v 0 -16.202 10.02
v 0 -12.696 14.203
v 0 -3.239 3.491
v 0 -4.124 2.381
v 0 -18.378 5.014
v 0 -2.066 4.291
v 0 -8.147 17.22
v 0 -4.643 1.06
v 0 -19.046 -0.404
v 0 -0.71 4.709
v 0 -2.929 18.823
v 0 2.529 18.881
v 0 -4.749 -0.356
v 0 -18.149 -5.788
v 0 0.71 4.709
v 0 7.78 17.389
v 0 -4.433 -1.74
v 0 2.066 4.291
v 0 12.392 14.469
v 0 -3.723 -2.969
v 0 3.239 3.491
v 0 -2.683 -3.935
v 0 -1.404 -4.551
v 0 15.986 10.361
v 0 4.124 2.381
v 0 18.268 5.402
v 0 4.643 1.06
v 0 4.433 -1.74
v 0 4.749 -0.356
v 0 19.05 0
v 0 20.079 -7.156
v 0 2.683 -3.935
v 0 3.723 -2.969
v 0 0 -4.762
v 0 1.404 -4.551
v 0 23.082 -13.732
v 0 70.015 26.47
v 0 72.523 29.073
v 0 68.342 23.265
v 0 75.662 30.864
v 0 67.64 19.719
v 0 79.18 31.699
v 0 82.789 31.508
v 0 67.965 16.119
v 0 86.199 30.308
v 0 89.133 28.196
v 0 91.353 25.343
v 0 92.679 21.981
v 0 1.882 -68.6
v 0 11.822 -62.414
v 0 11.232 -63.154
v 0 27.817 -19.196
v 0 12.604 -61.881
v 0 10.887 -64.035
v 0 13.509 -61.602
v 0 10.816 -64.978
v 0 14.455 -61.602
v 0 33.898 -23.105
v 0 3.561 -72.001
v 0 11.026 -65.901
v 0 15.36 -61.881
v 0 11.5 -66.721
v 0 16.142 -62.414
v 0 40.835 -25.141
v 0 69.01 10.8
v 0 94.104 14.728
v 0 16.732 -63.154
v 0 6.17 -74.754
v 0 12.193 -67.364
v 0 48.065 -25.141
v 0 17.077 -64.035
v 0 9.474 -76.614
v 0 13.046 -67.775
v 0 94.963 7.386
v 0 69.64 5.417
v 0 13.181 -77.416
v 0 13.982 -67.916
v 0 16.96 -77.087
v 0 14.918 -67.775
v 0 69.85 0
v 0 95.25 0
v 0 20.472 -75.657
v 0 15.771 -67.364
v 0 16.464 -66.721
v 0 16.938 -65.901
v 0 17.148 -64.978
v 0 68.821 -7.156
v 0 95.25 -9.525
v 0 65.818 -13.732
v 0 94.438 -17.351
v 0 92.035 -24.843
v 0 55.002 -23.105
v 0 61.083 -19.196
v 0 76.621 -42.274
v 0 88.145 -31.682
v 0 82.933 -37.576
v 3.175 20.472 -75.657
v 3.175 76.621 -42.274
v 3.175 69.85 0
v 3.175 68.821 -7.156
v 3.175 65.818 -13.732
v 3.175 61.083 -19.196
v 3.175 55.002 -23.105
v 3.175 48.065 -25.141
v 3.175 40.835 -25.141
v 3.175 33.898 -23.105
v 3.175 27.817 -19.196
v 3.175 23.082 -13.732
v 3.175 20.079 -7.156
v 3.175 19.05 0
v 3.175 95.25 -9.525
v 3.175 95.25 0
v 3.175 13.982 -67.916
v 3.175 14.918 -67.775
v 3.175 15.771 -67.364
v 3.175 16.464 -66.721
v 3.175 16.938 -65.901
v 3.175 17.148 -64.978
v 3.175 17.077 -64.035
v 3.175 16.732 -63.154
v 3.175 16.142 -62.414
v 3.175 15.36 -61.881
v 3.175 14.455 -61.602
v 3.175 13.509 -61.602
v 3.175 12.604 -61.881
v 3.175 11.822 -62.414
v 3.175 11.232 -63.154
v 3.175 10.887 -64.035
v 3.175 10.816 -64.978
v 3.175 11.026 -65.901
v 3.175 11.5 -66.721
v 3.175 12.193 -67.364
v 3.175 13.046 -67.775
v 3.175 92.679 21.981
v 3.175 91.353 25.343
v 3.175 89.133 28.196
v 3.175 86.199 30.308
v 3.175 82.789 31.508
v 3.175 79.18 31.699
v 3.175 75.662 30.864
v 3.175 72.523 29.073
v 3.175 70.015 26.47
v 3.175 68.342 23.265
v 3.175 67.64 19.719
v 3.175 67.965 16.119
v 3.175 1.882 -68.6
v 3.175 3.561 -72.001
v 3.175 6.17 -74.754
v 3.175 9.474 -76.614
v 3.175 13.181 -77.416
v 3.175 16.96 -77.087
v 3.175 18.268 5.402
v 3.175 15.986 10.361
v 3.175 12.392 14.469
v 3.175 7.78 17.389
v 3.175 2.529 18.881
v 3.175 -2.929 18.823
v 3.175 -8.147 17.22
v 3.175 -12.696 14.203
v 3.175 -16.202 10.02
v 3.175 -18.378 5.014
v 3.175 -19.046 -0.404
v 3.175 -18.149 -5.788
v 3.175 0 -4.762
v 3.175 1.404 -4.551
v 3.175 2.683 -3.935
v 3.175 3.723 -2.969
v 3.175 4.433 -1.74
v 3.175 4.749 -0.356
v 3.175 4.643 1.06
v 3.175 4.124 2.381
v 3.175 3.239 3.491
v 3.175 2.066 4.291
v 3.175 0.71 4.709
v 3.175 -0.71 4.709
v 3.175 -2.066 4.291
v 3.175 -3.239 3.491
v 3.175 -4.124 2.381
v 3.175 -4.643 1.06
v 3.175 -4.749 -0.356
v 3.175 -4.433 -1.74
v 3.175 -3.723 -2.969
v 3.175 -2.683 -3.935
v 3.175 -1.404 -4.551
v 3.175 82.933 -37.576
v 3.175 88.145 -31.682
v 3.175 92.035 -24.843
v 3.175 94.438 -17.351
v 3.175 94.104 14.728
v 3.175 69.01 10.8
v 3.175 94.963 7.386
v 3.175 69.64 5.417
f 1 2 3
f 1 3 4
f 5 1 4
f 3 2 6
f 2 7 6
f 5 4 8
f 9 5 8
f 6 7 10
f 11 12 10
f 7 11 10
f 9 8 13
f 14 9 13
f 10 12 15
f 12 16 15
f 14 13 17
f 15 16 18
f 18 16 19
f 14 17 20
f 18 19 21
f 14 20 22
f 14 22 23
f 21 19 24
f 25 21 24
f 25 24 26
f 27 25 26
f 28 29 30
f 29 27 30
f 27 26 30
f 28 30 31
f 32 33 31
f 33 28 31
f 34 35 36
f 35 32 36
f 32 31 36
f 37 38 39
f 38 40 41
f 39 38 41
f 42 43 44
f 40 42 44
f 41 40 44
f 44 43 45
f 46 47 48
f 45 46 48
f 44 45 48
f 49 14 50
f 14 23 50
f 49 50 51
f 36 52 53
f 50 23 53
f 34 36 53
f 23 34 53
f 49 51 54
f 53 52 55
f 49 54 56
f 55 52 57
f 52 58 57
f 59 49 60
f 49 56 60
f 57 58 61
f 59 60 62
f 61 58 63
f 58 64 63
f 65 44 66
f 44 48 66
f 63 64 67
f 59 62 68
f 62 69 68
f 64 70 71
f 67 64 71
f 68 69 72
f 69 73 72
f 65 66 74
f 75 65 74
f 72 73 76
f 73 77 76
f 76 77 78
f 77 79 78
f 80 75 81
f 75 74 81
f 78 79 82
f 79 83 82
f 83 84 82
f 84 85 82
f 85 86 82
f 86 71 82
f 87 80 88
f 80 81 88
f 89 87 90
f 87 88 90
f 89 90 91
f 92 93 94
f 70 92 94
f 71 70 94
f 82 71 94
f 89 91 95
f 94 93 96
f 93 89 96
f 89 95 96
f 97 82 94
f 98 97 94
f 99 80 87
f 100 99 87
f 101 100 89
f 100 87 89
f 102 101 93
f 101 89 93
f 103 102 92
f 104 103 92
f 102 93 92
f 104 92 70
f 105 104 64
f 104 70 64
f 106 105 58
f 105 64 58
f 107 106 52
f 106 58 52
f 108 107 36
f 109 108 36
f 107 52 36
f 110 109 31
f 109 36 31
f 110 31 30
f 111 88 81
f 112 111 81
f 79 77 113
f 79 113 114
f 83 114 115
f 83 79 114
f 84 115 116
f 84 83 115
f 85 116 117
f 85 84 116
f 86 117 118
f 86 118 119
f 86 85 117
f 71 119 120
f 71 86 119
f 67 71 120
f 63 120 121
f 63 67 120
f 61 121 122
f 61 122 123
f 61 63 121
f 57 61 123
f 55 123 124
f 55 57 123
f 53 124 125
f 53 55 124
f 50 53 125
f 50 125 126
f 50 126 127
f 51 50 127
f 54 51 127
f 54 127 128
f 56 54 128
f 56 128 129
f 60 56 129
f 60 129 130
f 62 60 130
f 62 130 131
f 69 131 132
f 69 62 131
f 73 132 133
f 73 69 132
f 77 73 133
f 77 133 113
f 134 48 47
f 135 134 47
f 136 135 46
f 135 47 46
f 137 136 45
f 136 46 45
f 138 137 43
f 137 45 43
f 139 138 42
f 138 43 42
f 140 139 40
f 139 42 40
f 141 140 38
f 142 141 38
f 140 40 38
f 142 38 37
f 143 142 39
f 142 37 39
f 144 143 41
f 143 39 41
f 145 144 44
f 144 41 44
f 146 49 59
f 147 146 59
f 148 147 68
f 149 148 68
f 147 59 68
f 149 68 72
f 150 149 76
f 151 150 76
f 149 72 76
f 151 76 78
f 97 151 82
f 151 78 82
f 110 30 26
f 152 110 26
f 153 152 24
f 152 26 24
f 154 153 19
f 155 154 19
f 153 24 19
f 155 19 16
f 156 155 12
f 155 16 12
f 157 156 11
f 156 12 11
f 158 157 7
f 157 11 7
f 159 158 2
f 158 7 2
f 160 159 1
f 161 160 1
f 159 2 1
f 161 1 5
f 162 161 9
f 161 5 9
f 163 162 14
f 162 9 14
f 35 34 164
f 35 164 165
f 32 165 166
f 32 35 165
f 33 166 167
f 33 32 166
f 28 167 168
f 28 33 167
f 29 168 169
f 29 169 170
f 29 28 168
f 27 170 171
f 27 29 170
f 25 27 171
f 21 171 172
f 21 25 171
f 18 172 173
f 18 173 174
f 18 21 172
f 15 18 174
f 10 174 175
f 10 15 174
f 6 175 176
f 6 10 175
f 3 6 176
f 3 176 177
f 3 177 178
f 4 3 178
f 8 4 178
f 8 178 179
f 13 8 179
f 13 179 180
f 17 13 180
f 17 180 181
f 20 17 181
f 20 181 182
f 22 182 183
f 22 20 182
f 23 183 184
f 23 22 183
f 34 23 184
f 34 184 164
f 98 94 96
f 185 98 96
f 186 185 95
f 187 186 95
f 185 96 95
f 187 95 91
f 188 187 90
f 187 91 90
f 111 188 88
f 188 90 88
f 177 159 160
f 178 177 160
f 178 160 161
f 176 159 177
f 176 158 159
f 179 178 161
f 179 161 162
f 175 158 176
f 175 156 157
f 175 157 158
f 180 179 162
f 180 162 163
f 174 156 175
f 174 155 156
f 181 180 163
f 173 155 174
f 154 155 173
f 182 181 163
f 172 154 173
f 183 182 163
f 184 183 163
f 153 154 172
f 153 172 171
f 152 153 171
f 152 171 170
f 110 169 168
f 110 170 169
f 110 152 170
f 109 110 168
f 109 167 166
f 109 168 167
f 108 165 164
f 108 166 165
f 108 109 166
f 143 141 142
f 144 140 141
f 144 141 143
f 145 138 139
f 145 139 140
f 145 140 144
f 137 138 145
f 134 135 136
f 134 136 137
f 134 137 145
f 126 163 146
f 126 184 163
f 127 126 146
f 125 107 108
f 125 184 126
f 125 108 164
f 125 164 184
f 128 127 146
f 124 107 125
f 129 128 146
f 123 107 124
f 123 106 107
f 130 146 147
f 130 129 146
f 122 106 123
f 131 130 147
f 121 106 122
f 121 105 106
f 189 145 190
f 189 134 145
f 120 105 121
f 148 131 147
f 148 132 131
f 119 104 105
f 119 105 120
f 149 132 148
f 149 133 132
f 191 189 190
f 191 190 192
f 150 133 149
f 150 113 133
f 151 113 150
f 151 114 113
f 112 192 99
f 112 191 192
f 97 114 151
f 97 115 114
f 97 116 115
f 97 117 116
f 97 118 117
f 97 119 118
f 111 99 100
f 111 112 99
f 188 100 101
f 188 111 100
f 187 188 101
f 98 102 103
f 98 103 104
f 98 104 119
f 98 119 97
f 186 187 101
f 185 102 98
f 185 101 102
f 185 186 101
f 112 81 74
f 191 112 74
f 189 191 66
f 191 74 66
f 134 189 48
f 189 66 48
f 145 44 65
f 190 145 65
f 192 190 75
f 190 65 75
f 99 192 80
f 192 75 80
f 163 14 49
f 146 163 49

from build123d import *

# Parameters (mm, degrees)
SKETCH1_R           = 4.7625
SKETCH1_R_2         = 3.175
BOSS_EXTRUDE1_DEPTH = 3.175


with BuildPart() as part:
    # Sketch1 → Boss-Extrude1 (new body)
    with BuildSketch(Plane(origin=(0, 0, 0), x_dir=(0, 0, -1), z_dir=(1, 0, 0))):
        with BuildLine():
            Line((5.788160309, -18.149371896), (68.599953325, 1.882435781))
            ThreePointArc((68.599953325, 1.882435781), (76.614344046, 9.474471101), (75.657464978, 20.472372782))
            Line((75.657464978, 20.472372782), (42.273855579, 76.621067209))
            ThreePointArc((42.273855579, 76.621067209), (28.363289988, 90.266896448), (9.525, 95.25))
            Line((9.525, 95.25), (0, 95.25))
            ThreePointArc((0, 95.25), (-11.065305521, 94.60508186), (-21.980769231, 92.679060656))
            ThreePointArc((-21.980769231, 92.679060656), (-31.407208087, 77.391083338), (-16.119230769, 67.964644481))
            ThreePointArc((-16.119230769, 67.964644481), (-8.114557382, 69.377060031), (0, 69.85))
            ThreePointArc((0, 69.85), (25.4, 44.45), (0, 19.05))
            ThreePointArc((0, 19.05), (-18.823496416, -2.928904691), (5.788160309, -18.149371896))
        make_face()
        Circle(SKETCH1_R, mode=Mode.SUBTRACT)
        with Locations((64.741179785, 13.982017045)):
            Circle(SKETCH1_R_2, mode=Mode.SUBTRACT)
    extrude(amount=BOSS_EXTRUDE1_DEPTH)


solid = part.part
